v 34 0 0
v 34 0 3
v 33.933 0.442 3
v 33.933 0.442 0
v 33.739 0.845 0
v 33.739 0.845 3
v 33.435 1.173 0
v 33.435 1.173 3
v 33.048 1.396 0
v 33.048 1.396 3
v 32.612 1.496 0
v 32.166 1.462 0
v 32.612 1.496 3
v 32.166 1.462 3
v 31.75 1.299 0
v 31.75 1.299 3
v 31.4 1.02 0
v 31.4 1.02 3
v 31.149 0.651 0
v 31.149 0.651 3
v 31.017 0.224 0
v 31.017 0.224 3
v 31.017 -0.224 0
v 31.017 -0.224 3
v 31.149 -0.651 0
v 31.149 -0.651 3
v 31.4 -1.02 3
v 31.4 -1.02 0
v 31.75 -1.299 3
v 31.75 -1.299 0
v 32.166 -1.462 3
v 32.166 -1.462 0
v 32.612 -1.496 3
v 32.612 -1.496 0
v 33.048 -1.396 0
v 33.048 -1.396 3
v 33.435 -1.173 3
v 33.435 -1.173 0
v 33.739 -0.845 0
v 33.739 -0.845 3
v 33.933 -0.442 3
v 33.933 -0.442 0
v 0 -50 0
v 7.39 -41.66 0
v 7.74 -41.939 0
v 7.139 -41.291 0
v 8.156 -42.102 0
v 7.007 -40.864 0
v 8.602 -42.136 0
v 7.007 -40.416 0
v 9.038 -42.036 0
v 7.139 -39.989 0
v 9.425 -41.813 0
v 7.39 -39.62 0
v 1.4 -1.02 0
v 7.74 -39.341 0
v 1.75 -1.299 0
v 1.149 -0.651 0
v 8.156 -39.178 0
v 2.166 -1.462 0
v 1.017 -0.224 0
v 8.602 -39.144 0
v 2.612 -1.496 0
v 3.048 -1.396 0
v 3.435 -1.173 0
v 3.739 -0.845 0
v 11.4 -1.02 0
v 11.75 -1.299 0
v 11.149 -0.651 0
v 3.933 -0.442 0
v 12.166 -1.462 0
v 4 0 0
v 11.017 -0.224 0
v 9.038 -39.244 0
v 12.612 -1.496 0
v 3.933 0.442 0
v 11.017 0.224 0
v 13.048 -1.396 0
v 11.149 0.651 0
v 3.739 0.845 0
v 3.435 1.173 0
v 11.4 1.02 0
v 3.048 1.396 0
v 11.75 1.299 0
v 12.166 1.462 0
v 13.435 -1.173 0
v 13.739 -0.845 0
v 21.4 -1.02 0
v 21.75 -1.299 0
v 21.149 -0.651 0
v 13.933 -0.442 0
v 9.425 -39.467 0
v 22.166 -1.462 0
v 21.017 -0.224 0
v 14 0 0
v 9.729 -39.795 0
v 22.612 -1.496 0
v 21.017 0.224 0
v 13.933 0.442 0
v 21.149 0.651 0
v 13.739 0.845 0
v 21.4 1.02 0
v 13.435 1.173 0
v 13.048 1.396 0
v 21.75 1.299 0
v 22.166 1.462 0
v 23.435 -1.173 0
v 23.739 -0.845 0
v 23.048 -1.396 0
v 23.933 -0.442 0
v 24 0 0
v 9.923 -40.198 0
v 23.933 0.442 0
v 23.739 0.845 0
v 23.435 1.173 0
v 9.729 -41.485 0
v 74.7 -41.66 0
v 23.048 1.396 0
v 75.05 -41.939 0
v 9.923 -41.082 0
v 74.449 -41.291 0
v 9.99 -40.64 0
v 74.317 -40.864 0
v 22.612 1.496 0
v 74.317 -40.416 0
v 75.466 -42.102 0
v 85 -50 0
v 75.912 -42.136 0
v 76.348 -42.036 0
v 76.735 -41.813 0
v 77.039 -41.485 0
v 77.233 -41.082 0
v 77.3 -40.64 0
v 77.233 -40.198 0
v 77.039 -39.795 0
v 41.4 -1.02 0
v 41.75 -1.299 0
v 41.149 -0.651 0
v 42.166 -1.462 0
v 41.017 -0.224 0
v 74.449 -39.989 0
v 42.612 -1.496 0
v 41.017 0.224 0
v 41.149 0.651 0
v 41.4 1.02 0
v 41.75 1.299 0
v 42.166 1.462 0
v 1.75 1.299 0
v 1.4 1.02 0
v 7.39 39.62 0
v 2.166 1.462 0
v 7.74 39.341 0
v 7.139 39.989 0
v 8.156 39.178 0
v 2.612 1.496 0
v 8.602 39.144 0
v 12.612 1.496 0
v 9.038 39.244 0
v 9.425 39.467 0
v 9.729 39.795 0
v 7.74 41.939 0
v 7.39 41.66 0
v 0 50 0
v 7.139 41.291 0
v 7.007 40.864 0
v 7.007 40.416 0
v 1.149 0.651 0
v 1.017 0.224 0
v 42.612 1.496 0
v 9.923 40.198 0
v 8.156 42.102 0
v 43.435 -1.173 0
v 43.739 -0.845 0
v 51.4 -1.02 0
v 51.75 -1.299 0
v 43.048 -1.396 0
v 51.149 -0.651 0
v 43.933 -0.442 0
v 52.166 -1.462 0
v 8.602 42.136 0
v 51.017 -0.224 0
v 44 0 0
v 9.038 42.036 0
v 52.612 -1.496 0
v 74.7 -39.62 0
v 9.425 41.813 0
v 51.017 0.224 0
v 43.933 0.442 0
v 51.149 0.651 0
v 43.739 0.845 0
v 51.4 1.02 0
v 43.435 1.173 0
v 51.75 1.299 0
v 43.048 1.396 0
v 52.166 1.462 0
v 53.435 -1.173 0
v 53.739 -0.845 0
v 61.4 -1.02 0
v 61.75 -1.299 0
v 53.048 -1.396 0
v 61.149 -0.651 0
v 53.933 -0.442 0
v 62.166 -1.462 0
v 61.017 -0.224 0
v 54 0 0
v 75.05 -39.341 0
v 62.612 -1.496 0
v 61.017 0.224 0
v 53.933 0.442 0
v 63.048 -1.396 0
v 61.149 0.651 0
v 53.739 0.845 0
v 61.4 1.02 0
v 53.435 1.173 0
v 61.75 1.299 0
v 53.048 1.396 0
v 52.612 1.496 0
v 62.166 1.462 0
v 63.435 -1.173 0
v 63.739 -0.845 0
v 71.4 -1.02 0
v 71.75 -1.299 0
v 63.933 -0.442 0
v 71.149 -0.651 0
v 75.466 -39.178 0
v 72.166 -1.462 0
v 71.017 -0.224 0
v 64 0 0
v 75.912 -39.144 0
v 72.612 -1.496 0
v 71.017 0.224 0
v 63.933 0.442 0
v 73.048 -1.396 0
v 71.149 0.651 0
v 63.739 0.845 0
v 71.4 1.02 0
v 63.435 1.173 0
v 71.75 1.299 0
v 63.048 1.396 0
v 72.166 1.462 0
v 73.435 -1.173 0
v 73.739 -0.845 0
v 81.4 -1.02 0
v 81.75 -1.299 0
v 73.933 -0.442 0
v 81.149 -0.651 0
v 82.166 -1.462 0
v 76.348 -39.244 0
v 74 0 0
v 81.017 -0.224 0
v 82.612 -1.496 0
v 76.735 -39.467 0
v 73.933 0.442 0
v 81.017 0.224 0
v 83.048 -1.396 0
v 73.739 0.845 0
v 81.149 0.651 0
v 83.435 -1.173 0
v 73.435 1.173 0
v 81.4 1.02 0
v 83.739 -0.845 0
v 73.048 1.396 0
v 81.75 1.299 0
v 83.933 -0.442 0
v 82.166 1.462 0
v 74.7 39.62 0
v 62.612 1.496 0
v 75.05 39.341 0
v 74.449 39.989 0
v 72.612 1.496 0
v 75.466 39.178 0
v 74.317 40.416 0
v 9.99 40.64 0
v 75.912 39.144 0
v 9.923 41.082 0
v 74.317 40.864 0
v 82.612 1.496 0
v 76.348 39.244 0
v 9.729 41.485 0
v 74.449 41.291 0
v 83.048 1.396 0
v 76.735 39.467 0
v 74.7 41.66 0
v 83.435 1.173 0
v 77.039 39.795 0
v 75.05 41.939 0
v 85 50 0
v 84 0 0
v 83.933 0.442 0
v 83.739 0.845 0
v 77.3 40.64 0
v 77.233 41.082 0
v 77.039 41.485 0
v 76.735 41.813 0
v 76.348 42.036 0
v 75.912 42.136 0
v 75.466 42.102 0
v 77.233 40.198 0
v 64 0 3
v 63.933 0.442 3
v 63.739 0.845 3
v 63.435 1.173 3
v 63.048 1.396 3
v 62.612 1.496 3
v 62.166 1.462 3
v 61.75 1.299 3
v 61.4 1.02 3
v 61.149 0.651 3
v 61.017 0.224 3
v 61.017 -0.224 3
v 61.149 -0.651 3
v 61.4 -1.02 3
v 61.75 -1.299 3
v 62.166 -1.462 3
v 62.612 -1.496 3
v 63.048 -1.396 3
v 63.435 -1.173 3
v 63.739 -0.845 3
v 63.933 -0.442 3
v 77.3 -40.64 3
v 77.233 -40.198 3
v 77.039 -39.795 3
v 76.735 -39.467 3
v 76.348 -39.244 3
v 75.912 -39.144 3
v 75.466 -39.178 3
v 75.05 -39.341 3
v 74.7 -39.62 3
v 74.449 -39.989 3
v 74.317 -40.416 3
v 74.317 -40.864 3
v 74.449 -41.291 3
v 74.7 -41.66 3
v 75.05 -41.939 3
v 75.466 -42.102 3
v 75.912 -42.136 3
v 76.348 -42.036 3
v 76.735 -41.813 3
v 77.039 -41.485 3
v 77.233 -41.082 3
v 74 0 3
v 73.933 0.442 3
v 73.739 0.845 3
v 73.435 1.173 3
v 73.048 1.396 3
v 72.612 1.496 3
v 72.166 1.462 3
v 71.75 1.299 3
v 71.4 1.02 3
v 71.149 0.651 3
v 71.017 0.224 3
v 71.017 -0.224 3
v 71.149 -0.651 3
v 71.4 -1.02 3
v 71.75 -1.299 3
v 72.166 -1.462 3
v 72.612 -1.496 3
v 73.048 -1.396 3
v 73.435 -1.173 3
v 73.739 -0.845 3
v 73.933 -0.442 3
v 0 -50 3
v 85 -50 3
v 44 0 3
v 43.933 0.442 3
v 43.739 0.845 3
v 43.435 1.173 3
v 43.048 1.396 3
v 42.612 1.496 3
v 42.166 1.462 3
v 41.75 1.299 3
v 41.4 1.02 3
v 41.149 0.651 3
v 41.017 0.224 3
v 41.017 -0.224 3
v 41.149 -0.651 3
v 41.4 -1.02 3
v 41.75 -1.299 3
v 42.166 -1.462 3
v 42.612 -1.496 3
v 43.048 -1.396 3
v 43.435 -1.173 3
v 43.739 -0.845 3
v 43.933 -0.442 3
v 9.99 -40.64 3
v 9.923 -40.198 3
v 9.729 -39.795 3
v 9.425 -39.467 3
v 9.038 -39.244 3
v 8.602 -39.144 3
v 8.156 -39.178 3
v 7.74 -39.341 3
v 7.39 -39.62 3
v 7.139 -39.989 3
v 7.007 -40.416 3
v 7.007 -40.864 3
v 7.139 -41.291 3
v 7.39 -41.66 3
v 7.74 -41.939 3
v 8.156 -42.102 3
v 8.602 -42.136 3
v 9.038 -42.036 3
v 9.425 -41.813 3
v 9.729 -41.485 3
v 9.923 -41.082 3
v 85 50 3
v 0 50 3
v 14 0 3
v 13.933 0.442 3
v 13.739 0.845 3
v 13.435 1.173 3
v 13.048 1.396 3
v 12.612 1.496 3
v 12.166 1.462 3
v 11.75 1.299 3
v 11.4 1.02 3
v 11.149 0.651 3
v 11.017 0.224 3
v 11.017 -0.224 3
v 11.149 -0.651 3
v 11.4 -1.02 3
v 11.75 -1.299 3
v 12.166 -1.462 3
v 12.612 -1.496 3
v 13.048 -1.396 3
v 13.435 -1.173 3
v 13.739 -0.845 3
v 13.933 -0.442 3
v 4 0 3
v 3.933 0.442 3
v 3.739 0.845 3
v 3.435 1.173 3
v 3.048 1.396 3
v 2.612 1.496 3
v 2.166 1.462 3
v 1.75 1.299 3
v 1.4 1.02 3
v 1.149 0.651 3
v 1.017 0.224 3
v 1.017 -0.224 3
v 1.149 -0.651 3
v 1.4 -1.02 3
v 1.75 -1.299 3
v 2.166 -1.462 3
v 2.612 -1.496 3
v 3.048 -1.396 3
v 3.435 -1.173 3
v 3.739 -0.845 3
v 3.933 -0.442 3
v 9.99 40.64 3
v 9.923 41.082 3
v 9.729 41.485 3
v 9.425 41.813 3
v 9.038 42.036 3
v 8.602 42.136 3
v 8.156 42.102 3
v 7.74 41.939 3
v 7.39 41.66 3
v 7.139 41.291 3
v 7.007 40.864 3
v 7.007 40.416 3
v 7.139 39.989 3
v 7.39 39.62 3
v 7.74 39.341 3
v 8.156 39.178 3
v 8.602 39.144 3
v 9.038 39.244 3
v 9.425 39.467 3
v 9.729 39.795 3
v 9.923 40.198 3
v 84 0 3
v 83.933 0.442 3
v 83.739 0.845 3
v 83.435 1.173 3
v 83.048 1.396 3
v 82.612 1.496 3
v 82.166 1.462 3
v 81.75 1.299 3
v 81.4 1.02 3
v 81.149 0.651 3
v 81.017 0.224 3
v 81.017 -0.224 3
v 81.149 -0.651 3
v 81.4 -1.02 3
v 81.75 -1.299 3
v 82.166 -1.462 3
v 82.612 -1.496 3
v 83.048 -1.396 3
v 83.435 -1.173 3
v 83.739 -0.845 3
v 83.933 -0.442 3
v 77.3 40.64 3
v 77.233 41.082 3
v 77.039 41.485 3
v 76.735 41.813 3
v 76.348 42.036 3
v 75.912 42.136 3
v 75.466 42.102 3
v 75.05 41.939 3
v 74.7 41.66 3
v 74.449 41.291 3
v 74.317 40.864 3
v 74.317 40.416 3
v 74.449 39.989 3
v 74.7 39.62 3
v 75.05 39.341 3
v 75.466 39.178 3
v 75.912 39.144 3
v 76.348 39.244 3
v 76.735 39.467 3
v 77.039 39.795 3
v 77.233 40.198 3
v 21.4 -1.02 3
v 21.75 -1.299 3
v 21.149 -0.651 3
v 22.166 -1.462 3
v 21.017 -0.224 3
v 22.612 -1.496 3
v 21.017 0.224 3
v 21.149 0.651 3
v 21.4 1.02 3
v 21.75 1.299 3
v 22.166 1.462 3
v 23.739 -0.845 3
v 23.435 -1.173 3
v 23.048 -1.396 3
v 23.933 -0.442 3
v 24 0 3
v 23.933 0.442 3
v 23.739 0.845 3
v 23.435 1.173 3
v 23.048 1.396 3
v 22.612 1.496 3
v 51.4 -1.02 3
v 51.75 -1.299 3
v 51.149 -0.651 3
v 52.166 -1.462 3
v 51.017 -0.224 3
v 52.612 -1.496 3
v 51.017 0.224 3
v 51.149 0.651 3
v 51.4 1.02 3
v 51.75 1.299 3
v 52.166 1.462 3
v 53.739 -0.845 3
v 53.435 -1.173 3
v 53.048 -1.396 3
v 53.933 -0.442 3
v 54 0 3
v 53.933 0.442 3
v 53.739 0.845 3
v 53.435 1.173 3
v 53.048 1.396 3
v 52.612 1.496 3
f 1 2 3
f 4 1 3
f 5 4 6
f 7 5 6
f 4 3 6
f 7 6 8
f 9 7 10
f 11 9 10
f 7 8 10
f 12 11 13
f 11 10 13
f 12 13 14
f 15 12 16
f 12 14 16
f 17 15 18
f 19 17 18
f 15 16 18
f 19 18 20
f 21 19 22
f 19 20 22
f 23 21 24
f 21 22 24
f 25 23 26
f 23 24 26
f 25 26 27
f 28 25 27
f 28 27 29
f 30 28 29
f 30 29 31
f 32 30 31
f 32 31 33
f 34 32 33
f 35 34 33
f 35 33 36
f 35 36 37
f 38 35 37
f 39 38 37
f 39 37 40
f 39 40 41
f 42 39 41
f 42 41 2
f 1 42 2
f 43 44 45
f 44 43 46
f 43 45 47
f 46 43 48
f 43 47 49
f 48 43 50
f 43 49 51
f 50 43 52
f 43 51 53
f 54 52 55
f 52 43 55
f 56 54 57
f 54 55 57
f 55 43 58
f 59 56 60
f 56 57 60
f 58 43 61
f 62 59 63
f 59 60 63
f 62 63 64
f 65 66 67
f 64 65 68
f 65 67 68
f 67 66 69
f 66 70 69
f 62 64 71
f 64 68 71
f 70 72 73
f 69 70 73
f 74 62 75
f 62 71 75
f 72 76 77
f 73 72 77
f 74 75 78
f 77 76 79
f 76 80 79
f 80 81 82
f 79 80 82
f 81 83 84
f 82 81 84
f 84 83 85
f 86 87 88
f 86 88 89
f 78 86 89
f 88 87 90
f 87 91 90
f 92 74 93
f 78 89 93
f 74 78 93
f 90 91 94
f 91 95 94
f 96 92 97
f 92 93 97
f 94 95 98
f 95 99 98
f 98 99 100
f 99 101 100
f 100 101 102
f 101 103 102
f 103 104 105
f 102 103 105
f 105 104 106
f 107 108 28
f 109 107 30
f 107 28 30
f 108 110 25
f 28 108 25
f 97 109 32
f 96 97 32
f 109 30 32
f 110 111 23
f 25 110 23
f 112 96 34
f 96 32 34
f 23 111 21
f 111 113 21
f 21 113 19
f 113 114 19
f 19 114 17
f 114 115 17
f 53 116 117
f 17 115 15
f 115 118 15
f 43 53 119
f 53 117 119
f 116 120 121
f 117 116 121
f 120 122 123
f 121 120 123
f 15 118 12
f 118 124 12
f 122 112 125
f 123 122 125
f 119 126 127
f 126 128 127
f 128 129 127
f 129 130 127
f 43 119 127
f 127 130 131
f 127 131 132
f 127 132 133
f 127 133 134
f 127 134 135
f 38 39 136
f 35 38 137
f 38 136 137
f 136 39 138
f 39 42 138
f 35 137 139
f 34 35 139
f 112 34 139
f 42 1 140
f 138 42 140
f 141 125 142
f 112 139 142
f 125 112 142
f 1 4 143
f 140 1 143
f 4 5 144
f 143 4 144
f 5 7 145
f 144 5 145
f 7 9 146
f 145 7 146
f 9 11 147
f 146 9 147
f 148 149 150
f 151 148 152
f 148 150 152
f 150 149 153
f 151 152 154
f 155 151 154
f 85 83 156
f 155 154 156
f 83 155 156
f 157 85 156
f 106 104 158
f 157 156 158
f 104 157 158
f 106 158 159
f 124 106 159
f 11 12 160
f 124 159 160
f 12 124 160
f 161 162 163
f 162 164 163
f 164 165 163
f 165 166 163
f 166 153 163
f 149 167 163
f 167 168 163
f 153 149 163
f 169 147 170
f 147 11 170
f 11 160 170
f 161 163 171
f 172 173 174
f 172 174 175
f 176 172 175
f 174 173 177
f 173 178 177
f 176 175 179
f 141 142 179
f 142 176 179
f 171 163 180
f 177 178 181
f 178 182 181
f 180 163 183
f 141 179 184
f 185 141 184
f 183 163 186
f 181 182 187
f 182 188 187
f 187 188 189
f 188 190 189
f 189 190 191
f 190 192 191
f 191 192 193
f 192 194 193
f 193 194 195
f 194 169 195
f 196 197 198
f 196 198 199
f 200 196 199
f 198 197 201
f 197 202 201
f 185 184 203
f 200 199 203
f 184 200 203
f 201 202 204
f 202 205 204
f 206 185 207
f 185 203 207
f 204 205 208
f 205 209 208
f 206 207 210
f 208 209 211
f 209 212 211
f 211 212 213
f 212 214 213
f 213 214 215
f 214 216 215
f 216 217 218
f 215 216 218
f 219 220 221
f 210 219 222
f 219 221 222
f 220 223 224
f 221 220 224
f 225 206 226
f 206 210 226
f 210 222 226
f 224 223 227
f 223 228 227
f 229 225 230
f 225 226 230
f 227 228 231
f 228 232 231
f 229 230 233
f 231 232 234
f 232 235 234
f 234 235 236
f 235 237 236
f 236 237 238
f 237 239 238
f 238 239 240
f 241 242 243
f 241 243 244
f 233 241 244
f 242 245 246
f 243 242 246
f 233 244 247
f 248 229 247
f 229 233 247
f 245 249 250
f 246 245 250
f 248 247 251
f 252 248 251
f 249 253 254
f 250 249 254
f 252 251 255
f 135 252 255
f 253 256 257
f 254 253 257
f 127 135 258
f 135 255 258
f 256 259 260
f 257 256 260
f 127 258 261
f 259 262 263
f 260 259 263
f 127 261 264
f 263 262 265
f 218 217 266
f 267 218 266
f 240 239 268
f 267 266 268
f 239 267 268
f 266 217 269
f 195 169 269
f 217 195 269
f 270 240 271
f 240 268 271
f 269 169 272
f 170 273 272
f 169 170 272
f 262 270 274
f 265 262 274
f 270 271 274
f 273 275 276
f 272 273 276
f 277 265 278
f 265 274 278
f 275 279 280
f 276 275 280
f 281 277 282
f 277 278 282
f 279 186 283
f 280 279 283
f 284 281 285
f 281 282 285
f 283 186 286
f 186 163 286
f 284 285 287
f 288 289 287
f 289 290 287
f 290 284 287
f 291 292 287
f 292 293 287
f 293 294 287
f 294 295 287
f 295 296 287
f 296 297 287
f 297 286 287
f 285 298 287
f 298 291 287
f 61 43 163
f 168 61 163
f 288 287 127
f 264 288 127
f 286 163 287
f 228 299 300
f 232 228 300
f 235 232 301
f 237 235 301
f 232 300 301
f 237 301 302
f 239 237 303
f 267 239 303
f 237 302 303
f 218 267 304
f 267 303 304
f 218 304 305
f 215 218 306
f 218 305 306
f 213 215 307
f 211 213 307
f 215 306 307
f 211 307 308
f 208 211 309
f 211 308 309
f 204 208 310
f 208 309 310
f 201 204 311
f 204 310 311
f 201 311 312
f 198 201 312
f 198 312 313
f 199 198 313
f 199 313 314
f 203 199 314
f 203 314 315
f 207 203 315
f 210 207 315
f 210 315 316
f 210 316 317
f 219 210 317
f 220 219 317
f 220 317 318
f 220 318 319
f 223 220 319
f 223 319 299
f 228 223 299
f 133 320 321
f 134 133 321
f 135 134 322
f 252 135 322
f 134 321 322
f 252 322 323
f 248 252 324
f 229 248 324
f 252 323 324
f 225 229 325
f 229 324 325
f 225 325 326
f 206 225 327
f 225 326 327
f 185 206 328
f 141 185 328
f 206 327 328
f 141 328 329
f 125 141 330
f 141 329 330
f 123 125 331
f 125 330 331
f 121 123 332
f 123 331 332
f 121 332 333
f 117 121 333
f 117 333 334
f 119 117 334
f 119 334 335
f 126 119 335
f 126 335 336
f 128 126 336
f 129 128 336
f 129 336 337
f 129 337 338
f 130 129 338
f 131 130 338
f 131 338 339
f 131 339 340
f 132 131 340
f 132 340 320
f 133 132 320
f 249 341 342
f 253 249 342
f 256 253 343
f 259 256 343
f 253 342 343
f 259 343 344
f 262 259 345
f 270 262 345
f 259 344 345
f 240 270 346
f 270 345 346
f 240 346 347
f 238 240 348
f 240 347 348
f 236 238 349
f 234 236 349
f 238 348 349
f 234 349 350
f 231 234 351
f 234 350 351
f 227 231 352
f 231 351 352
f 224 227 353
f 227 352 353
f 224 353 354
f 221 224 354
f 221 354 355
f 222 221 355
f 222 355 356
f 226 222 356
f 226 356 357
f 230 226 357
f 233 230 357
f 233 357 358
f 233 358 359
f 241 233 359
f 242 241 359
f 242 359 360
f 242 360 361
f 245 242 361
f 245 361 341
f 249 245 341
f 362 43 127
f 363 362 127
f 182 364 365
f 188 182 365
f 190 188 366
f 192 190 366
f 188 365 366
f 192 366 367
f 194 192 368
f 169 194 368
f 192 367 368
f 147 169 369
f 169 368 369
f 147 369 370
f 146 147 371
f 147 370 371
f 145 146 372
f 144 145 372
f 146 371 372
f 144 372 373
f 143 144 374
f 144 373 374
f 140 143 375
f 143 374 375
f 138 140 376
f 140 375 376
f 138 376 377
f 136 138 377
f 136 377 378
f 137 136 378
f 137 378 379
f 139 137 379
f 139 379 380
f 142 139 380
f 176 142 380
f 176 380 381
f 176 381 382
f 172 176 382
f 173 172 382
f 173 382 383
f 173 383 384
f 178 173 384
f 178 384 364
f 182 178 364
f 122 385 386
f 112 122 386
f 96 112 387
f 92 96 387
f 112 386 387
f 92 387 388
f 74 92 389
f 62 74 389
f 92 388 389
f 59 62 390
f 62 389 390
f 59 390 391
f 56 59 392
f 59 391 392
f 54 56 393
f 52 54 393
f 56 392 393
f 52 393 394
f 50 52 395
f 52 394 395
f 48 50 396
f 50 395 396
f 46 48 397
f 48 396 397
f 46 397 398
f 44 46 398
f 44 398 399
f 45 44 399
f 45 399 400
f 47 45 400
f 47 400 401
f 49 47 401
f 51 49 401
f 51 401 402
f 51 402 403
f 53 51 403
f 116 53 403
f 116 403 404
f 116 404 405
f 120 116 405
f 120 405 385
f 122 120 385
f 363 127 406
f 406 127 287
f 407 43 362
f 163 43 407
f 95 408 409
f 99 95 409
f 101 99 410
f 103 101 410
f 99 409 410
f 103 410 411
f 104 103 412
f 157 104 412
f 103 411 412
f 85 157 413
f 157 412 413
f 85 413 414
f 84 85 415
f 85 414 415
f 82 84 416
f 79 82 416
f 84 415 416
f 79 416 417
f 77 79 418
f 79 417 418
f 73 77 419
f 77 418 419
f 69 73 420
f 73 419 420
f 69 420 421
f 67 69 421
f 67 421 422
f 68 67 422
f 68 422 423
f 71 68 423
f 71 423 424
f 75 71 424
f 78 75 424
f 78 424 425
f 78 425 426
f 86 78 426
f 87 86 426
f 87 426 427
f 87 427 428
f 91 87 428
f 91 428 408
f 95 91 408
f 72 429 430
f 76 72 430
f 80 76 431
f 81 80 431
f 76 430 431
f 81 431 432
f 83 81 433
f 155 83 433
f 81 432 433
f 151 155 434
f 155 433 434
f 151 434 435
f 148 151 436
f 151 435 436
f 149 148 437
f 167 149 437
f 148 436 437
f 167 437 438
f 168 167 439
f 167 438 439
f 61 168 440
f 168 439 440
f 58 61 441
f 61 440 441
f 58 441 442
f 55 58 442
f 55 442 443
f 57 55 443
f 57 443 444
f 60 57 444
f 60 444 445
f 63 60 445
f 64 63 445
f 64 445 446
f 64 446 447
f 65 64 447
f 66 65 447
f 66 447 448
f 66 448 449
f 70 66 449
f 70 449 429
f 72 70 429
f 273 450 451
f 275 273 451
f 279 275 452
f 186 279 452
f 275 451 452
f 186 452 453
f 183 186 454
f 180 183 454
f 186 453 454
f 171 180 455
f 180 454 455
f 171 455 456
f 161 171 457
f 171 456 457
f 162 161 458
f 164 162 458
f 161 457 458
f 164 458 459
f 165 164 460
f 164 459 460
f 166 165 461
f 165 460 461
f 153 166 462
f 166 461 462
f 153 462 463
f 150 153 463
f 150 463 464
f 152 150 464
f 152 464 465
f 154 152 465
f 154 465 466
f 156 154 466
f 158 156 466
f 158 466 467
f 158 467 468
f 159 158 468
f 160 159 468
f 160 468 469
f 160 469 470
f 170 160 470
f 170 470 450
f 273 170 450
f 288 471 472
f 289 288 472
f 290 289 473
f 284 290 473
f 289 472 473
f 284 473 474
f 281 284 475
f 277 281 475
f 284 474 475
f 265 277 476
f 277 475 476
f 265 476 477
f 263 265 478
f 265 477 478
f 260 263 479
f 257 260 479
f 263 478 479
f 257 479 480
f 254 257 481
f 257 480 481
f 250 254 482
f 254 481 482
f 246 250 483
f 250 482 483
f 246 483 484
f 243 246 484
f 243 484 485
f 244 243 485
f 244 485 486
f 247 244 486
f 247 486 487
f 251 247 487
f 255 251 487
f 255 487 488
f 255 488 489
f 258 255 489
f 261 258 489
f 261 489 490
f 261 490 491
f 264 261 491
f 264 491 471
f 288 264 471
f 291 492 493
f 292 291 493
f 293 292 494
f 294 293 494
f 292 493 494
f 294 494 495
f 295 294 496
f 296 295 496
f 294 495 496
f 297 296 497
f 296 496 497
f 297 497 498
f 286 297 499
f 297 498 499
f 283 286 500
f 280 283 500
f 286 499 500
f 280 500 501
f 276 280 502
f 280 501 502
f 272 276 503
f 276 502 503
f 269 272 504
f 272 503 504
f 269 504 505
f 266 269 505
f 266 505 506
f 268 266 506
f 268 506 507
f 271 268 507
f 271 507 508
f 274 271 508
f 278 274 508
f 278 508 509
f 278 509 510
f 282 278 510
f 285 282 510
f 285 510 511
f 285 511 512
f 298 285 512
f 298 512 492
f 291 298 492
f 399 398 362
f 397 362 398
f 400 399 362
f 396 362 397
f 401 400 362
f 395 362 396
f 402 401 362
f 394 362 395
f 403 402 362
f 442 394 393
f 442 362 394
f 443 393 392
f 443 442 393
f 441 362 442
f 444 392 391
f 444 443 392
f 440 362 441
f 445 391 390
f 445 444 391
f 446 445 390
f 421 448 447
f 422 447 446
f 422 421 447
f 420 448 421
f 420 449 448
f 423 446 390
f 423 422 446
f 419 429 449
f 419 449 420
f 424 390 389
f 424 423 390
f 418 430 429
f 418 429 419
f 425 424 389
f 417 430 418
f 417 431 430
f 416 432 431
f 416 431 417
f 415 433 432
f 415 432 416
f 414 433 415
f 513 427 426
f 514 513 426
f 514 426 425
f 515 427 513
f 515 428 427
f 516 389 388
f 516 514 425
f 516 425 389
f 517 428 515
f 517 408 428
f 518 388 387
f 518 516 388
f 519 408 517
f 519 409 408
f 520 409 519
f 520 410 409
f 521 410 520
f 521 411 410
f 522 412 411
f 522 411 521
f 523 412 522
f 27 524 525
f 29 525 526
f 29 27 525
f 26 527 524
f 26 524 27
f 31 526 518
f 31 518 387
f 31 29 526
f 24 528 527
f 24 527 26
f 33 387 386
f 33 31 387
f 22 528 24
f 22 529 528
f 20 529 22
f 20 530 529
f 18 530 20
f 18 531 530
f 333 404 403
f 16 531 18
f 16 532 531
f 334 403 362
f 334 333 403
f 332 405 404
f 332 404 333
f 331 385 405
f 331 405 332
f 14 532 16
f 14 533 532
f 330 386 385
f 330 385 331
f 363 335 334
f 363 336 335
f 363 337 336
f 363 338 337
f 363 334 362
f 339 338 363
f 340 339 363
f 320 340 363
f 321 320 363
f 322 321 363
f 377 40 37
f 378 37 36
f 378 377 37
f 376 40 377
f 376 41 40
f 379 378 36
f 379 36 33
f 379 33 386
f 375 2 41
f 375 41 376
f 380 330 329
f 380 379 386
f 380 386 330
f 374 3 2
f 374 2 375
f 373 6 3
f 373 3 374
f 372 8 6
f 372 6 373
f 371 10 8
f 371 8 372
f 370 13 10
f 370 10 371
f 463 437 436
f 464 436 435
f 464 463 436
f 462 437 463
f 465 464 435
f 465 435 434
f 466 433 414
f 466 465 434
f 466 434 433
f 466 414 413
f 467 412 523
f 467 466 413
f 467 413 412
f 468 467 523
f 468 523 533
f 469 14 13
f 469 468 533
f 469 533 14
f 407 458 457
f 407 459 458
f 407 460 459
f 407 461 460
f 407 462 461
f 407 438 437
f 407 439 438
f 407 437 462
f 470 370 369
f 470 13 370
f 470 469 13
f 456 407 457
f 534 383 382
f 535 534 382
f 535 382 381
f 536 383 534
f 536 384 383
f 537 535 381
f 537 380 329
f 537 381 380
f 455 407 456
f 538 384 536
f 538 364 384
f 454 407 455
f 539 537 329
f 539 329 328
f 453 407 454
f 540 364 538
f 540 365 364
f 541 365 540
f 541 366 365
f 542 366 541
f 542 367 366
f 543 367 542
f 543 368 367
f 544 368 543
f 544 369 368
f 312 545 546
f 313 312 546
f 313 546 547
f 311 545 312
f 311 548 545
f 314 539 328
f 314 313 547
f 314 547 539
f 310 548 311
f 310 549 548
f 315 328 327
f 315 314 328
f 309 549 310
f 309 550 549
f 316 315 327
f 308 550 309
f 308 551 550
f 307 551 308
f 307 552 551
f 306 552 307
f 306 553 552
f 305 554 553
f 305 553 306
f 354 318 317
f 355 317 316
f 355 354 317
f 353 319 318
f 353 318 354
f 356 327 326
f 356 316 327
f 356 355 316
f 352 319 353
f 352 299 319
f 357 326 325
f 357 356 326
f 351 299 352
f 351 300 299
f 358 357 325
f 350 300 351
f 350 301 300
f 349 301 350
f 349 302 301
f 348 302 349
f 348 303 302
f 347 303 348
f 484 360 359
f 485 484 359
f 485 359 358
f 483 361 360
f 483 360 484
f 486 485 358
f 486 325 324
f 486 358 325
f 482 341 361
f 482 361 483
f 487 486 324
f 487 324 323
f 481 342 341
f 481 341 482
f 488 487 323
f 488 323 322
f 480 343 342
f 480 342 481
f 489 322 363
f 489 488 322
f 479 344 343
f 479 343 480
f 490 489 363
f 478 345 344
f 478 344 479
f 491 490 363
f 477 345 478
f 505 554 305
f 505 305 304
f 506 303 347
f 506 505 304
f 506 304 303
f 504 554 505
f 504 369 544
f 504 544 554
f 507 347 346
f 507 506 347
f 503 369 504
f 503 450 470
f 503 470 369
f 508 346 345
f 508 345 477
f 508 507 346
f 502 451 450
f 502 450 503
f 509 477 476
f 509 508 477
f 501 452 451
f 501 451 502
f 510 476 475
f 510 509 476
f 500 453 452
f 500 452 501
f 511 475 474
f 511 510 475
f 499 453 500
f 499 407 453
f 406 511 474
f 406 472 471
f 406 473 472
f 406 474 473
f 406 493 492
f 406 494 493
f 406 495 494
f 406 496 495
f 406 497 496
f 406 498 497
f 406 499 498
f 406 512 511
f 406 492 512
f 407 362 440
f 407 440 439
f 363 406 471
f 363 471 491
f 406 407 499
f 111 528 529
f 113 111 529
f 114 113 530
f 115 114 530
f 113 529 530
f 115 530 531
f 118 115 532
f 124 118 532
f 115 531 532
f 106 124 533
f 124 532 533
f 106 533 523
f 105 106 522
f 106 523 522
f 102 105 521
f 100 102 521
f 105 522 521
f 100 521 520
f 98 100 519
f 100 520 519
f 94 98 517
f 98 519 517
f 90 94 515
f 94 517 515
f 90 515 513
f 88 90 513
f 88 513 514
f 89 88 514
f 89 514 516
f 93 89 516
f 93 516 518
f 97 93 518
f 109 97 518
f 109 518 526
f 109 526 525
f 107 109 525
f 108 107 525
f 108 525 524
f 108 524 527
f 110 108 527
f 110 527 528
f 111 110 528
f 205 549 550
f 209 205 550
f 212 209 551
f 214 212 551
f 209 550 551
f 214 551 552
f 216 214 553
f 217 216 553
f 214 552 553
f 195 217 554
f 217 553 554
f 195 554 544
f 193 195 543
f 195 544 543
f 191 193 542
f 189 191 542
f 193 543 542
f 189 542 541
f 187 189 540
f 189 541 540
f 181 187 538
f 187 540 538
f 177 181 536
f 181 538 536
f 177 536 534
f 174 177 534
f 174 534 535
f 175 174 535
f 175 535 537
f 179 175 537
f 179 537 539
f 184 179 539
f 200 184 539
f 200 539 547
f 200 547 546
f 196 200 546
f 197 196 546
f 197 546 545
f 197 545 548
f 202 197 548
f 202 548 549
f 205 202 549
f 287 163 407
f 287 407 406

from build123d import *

# Parameters (mm, degrees)
SKETCH1_W           = 85
SKETCH1_H           = 100
BOSS_EXTRUDE1_DEPTH = 3
SKETCH2_R           = 1.5
CUT_EXTRUDE1_DEPTH  = 4
SKETCH3_R           = 1.5
CUT_EXTRUDE2_DEPTH  = 10


with BuildPart() as part:
    # Sketch1 → Boss-Extrude1 (new body)
    with BuildSketch(Plane.XY):
        with Locations((42.5, 0)):
            Rectangle(SKETCH1_W, SKETCH1_H)
    extrude(amount=BOSS_EXTRUDE1_DEPTH)

    # Sketch2 → Cut-Extrude1 (cut)
    with BuildSketch(Plane.XY.offset(3)):
        with Locations((75.8, 40.64)):
            Circle(SKETCH2_R)
        with Locations((75.8, -40.64)):
            Circle(SKETCH2_R)
        with Locations((8.49, 40.64)):
            Circle(SKETCH2_R)
        with Locations((8.49, -40.64)):
            Circle(SKETCH2_R)
    extrude(amount=-CUT_EXTRUDE1_DEPTH, mode=Mode.SUBTRACT)

    # Sketch3 → Cut-Extrude2 (cut)
    with BuildSketch(Plane.XY.offset(3)):
        with Locations((42.5, 0)):
            Circle(SKETCH3_R)
        with Locations((52.5, 0)):
            Circle(SKETCH3_R)
        with Locations((62.5, 0)):
            Circle(SKETCH3_R)
        with Locations((72.5, 0)):
            Circle(SKETCH3_R)
        with Locations((82.5, 0)):
            Circle(SKETCH3_R)
        with Locations((32.5, 0)):
            Circle(SKETCH3_R)
        with Locations((22.5, 0)):
            Circle(SKETCH3_R)
        with Locations((12.5, 0)):
            Circle(SKETCH3_R)
        with Locations((2.5, 0)):
            Circle(SKETCH3_R)
    extrude(amount=-CUT_EXTRUDE2_DEPTH, mode=Mode.SUBTRACT)


solid = part.part
